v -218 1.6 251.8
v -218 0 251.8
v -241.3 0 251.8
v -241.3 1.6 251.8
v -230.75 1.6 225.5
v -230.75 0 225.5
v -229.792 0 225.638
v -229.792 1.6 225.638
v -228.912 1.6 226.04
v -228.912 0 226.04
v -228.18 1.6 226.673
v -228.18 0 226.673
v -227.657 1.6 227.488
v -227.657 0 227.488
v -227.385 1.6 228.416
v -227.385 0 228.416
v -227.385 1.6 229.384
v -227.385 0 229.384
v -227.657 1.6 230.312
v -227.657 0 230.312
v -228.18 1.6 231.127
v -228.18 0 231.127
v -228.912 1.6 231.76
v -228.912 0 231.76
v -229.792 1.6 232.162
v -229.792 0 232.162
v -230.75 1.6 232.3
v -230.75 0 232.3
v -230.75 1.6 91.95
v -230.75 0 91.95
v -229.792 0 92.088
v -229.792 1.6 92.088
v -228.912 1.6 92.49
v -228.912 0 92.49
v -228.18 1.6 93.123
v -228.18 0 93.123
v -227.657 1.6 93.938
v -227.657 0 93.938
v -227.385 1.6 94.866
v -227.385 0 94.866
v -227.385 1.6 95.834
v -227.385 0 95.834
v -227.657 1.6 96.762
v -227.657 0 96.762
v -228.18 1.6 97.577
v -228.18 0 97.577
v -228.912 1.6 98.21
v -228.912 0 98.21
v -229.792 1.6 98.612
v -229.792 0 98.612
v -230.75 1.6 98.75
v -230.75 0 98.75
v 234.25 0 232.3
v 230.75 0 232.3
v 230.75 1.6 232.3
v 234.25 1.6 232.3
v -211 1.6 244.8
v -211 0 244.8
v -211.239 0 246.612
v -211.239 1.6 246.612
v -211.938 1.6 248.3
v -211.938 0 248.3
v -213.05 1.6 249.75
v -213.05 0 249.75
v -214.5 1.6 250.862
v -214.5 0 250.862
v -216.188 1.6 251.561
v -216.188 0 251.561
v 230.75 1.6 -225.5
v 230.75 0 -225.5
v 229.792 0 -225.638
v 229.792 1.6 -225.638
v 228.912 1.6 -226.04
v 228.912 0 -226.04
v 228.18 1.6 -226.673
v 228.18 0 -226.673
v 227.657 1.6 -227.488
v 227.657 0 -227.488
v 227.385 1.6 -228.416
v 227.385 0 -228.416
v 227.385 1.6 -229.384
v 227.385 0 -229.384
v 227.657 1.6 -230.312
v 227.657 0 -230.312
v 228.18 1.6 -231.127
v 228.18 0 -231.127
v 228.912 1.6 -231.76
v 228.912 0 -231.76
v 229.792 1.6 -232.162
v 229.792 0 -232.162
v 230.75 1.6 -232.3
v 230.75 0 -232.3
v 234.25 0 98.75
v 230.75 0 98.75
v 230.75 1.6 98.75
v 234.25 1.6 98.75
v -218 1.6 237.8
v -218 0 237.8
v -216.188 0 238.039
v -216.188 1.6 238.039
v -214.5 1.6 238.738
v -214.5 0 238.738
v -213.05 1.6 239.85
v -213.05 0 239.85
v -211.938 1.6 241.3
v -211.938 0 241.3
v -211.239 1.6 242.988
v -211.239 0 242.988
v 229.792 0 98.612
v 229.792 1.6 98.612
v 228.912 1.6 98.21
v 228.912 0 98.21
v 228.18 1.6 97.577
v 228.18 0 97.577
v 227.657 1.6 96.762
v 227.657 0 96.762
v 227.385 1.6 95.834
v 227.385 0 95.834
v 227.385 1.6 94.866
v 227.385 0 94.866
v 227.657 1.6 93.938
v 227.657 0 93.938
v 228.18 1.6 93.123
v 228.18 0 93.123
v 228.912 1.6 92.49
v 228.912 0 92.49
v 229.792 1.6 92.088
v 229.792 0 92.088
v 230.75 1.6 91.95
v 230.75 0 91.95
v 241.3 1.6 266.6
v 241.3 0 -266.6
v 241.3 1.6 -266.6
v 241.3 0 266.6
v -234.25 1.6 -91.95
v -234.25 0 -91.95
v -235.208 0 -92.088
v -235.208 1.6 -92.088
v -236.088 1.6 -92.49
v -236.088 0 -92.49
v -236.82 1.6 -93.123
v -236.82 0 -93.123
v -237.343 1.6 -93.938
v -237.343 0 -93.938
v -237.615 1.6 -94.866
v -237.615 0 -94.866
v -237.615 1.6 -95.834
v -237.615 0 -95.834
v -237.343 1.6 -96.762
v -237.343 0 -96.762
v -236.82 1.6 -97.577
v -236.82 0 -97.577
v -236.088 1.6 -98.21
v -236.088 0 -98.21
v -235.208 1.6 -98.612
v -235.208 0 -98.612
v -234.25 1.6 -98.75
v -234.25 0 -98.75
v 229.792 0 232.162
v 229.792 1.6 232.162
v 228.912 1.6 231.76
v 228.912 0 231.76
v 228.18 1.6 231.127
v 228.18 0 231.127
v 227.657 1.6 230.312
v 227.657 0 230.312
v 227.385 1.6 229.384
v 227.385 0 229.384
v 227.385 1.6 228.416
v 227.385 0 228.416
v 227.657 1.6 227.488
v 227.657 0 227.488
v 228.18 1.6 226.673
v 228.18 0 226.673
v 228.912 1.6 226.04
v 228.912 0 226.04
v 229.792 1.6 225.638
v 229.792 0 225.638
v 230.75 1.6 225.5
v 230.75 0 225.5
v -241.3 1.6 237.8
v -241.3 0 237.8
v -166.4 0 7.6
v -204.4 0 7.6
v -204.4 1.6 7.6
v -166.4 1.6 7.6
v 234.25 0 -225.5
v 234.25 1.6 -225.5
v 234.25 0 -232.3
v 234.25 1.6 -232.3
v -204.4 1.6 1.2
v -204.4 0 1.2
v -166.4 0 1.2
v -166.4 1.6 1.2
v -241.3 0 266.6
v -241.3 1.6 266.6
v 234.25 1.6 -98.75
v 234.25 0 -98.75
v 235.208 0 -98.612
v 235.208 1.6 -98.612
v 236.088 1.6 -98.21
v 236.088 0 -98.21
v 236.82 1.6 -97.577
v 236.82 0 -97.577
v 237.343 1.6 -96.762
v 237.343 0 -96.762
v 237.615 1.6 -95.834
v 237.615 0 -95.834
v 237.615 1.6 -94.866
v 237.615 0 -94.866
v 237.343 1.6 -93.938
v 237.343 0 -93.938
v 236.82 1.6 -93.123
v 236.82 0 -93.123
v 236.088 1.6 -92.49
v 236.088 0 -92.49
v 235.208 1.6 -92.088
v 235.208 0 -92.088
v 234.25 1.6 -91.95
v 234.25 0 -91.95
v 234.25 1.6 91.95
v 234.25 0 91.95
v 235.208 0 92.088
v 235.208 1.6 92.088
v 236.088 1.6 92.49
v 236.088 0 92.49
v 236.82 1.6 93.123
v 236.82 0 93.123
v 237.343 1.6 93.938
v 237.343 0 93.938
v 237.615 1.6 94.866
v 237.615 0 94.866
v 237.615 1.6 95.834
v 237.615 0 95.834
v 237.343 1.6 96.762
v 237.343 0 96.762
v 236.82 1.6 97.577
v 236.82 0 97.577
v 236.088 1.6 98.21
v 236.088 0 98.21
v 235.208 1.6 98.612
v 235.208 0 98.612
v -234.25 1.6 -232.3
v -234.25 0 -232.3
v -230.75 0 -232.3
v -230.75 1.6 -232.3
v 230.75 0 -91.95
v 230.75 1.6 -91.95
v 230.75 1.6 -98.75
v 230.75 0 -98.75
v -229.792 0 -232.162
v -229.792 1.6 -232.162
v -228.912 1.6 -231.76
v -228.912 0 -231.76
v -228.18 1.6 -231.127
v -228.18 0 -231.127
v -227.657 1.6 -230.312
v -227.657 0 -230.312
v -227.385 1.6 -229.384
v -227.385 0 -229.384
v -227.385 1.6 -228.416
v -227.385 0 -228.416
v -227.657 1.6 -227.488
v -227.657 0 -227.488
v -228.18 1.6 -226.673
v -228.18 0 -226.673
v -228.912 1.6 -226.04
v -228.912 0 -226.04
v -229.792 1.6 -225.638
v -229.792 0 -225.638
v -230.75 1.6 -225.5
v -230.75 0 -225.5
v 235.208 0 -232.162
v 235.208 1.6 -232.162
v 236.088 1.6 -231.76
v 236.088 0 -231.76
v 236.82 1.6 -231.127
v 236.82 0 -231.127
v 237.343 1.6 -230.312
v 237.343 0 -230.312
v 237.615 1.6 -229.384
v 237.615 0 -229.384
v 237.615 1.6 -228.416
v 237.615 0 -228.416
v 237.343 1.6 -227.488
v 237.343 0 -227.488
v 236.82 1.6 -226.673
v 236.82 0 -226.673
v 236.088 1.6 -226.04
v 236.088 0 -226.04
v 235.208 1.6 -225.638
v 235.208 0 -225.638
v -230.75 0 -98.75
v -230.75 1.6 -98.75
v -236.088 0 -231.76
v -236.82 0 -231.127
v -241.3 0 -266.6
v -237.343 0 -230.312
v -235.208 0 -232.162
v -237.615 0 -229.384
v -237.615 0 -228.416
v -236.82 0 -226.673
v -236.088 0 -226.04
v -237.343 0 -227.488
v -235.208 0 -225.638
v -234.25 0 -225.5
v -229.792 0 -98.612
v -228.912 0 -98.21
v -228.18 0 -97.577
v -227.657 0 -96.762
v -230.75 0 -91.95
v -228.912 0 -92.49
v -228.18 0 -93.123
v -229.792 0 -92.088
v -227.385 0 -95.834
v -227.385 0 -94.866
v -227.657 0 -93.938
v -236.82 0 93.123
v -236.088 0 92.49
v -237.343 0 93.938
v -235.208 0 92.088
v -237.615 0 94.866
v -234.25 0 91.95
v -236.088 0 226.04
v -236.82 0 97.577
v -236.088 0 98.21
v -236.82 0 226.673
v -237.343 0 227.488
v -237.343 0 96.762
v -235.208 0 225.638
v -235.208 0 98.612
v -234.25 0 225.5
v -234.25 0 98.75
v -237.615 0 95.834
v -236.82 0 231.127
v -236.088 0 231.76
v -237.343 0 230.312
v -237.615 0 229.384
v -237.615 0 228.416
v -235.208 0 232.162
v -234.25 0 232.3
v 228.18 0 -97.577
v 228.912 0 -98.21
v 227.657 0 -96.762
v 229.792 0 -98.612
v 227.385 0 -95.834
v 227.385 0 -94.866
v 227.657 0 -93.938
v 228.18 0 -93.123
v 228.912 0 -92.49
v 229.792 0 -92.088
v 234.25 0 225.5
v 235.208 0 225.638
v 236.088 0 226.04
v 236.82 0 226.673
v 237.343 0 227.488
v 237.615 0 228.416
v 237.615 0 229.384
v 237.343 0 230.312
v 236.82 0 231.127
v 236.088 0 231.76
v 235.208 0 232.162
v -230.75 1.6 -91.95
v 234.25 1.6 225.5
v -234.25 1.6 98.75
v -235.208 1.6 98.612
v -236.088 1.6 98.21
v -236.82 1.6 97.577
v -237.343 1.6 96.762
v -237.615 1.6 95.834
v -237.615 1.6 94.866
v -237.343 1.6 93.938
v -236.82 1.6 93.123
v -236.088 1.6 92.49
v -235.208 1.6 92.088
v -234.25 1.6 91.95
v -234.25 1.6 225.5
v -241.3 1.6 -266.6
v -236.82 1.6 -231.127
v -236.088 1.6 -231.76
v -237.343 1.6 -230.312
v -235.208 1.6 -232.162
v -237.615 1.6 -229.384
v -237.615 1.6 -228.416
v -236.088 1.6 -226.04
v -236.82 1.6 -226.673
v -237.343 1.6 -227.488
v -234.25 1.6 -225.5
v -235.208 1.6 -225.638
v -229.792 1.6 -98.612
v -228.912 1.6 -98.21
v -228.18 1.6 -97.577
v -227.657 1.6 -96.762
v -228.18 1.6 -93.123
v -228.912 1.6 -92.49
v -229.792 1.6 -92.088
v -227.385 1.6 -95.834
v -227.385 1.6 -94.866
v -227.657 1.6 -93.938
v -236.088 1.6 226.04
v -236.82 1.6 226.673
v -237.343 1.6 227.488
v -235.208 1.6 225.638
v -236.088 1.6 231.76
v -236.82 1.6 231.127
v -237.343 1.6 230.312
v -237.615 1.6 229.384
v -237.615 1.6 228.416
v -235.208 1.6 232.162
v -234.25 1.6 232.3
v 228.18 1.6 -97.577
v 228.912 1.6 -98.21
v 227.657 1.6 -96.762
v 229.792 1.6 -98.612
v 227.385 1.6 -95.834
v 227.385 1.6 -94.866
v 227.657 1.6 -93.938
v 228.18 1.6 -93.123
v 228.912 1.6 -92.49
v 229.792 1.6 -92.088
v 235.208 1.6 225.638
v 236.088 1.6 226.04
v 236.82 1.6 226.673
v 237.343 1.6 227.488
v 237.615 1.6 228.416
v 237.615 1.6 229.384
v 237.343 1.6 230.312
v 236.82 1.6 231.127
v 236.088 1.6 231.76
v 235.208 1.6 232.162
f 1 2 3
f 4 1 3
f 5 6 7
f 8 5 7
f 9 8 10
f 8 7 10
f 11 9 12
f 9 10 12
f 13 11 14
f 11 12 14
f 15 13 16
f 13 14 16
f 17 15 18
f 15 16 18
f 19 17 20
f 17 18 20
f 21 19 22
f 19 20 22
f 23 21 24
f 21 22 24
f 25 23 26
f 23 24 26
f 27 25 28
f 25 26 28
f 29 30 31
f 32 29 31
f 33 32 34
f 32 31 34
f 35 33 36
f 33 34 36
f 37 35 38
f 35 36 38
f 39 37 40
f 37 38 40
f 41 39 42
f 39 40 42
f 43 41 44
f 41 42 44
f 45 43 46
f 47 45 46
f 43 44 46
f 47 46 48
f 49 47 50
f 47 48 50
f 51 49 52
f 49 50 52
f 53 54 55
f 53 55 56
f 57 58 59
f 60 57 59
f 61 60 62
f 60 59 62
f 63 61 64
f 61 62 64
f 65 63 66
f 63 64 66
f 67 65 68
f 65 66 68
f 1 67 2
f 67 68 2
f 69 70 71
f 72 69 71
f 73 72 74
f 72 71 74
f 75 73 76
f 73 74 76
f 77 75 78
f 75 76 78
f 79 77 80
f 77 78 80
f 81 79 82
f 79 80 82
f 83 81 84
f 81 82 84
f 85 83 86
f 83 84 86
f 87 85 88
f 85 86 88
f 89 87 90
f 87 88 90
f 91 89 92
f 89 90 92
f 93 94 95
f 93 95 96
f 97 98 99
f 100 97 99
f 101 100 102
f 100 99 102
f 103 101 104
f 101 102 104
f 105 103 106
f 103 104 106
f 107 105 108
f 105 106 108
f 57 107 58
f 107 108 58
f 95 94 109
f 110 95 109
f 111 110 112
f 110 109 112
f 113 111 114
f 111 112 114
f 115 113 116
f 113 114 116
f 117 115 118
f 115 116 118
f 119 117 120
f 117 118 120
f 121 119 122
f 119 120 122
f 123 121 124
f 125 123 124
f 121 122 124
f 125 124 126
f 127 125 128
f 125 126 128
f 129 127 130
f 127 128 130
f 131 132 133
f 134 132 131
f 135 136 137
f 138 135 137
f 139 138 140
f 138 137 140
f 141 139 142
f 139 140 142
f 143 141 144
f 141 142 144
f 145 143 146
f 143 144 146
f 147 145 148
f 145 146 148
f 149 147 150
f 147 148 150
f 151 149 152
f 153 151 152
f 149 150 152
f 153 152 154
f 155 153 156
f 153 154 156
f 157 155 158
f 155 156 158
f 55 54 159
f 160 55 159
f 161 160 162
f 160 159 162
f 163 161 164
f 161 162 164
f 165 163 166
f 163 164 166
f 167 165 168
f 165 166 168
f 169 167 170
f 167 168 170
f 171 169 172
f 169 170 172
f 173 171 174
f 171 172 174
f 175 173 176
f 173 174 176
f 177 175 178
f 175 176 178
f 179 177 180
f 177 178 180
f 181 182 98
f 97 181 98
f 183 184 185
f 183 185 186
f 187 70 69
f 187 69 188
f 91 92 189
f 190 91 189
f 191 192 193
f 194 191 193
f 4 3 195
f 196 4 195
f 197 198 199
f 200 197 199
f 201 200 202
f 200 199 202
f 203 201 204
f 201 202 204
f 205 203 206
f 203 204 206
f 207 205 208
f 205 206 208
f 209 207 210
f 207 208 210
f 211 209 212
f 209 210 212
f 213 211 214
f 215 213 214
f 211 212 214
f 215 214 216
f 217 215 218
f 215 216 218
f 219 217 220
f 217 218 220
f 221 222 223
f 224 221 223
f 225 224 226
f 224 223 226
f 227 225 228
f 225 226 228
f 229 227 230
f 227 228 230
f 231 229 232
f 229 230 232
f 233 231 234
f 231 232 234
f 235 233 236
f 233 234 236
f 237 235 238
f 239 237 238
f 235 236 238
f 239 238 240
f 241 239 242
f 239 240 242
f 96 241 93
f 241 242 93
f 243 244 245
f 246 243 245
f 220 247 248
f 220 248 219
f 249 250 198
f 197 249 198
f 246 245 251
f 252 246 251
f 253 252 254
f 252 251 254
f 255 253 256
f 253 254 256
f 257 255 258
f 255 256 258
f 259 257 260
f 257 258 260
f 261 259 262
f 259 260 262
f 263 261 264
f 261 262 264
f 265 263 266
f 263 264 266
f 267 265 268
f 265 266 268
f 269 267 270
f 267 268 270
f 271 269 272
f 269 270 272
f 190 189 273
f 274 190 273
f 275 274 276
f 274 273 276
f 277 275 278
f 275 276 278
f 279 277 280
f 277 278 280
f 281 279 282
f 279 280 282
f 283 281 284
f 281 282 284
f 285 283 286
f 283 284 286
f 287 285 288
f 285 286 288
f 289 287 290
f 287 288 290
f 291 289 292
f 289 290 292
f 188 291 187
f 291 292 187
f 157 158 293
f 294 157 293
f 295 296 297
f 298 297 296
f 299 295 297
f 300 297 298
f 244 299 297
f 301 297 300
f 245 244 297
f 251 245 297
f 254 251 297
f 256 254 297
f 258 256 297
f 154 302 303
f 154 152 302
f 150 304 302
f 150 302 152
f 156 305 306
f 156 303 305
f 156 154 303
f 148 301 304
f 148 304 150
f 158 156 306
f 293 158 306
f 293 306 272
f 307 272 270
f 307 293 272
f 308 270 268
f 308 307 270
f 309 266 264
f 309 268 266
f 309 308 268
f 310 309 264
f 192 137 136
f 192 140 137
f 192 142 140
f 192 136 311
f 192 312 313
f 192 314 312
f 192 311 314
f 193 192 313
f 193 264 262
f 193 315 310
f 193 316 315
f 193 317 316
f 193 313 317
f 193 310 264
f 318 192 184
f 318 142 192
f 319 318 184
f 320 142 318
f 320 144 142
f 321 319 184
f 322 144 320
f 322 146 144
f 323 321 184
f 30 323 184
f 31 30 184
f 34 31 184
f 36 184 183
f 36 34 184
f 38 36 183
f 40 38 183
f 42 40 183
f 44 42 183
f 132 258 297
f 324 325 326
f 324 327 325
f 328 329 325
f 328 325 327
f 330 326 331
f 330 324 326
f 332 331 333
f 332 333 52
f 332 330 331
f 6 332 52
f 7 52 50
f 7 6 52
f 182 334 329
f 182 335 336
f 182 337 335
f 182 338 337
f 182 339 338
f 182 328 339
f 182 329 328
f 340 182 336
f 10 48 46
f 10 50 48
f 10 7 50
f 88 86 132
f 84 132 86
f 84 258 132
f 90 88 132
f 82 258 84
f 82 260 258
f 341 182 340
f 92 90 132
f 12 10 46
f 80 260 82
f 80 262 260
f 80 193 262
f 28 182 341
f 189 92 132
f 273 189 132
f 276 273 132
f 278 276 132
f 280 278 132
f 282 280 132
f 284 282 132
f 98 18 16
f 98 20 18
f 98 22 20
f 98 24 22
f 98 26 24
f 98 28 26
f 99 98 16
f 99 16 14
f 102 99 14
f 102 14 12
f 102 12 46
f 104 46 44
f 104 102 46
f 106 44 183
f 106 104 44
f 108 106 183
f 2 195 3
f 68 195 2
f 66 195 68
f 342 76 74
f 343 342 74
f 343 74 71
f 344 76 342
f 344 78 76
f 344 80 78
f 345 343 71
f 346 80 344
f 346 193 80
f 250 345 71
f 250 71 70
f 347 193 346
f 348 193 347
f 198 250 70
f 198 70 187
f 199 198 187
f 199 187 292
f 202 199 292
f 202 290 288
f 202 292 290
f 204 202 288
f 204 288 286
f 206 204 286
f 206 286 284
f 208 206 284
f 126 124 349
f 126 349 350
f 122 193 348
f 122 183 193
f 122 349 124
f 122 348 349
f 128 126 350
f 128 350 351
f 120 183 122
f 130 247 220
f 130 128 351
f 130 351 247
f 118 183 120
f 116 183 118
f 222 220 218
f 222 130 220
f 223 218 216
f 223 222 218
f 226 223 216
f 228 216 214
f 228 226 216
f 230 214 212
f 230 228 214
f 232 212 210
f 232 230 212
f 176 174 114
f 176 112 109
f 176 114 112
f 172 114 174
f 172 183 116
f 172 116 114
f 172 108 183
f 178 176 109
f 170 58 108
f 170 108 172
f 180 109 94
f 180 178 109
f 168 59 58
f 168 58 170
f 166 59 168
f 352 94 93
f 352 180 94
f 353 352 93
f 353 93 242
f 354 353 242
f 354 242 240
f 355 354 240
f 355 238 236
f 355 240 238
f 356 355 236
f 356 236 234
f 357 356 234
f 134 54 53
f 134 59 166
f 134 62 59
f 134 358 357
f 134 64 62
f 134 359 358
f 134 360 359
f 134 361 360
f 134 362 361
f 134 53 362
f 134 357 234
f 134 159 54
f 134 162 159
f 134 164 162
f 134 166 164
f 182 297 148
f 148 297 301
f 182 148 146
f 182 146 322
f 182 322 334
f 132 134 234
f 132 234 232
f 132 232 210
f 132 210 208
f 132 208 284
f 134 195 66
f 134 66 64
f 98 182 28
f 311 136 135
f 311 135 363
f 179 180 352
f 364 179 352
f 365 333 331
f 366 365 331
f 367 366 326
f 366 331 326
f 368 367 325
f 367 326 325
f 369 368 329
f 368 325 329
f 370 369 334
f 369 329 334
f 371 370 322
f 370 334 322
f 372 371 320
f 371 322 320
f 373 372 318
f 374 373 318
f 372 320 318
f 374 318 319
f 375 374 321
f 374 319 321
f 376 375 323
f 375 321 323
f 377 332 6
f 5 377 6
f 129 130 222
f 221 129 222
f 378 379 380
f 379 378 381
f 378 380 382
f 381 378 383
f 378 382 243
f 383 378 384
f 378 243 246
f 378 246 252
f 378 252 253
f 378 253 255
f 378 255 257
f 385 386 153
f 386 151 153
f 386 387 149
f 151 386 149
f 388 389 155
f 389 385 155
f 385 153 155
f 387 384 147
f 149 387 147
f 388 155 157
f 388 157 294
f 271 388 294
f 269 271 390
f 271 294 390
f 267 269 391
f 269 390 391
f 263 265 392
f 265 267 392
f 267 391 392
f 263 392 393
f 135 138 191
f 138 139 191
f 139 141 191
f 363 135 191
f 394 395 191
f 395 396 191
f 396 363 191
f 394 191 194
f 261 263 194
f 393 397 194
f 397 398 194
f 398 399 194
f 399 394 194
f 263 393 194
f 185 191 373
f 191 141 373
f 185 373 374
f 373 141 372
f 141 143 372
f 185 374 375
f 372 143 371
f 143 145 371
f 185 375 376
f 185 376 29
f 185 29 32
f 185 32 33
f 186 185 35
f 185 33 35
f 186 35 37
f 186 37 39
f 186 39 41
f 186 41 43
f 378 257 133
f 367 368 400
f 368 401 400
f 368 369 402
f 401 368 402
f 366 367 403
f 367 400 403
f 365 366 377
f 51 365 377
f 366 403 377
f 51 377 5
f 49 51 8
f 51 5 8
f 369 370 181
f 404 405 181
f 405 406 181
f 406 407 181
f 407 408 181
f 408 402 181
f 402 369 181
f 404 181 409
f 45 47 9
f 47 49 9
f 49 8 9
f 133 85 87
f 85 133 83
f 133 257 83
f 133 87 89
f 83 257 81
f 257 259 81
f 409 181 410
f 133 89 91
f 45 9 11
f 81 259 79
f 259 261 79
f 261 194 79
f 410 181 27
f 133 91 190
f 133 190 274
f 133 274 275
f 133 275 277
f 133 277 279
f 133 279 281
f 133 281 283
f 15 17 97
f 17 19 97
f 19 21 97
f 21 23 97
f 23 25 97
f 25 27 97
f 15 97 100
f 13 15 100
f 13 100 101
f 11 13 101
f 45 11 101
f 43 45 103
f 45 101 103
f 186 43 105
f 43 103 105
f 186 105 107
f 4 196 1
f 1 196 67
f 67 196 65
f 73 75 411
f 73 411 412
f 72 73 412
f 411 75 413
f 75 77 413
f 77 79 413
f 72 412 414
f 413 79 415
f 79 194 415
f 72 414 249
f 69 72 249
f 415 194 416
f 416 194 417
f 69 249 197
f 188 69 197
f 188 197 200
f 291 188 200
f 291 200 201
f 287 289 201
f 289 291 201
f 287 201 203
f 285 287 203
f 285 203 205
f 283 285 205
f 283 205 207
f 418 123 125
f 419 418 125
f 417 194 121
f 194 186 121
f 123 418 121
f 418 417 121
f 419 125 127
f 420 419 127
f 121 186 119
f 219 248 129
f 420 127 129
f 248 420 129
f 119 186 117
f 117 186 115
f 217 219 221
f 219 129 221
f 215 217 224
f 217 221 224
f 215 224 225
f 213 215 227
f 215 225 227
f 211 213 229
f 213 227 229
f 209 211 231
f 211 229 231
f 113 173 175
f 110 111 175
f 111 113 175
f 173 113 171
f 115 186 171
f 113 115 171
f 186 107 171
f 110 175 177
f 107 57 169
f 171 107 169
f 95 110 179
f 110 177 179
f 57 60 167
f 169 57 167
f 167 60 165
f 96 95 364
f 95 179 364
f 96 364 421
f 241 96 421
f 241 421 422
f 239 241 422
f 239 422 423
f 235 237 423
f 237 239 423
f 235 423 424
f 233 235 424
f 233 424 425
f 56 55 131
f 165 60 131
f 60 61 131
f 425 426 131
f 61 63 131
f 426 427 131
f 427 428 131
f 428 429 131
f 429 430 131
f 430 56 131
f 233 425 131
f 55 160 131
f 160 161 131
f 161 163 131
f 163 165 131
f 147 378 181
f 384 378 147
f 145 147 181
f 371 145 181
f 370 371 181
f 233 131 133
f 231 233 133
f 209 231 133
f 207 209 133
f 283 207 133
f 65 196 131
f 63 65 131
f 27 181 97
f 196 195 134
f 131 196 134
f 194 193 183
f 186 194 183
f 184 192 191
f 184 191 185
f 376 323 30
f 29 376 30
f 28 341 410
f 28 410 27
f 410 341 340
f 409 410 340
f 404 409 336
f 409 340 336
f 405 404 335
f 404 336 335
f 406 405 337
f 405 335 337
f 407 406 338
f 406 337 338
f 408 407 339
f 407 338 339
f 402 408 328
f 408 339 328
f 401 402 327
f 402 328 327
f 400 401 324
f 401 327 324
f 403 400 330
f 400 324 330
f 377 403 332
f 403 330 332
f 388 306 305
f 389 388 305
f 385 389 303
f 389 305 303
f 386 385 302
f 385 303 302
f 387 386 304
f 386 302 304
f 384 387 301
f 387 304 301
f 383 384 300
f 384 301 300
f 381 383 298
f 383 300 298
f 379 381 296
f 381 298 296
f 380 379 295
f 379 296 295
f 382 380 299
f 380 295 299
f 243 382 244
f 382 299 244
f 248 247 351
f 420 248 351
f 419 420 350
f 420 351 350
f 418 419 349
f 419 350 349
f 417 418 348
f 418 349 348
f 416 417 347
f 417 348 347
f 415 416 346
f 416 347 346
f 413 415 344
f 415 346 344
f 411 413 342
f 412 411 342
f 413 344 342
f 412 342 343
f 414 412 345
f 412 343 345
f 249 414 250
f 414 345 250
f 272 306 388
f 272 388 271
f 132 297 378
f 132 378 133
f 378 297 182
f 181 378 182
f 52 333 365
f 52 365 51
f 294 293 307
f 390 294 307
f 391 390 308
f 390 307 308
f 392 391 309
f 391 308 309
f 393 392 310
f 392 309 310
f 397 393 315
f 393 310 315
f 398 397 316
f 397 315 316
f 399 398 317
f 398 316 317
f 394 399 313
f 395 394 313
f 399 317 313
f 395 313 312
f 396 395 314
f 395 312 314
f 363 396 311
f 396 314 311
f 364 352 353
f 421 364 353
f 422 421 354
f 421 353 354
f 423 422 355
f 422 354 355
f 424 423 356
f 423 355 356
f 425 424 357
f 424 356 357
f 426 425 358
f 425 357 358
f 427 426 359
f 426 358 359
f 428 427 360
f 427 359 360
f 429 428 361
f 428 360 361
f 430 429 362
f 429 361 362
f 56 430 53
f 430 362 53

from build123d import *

# Parameters (mm, degrees)
F0_W      = 482.6
F0_H      = 533.2
F1_DEPTH  = 1.6
F10_W     = 38
F10_H     = 6.4
F11_DEPTH = 1.6
F2_W      = 3.5
F2_H      = 6.8
F3_W      = 3.5
F3_H      = 6.8
F4_W      = 3.5
F4_H      = 6.8
F5_W      = 3.5
F5_H      = 6.8
F6_W      = 3.5
F6_H      = 6.8
F7_W      = 3.5
F7_H      = 6.8
F8_W      = 3.5
F8_H      = 6.8
F9_W      = 3.5
F9_H      = 6.8
F12_DEPTH = 1.6
F14_DEPTH = 1.6


with BuildPart() as f1:
    # F0 (on Front) → F1 (new body)
    with BuildSketch(Plane.XZ):
        Rectangle(F0_W, F0_H)
    extrude(amount=-F1_DEPTH)

    # F10 (on face) → F11 (cut)
    with BuildSketch(Plane.XZ):
        with Locations((-185.4, 4.4)):
            Rectangle(F10_W, F10_H)
    extrude(amount=-F11_DEPTH, mode=Mode.SUBTRACT)

    # F2 (on face) + F3 (on face) + F4 (on face) + F5 (on face) + F6 (on face) + F7 (on face) + F8 (on face) + F9 (on face) → F12 (cut)
    with BuildSketch(Plane.XZ):
        with Locations((-232.5, 228.9)):
            Rectangle(F2_W, F2_H)
        with BuildLine():
            Line((-230.75, 232.3), (-230.75, 225.5))
            ThreePointArc((-230.75, 225.5), (-227.35, 228.9), (-230.75, 232.3))
        make_face()
        with BuildLine():
            ThreePointArc((-234.25, 232.3), (-237.65, 228.9), (-234.25, 225.5))
            Line((-234.25, 225.5), (-234.25, 232.3))
        make_face()
    with BuildSketch(Plane.XZ):
        with Locations((-232.5, 95.35)):
            Rectangle(F3_W, F3_H)
        with BuildLine():
            Line((-230.75, 98.75), (-230.75, 91.95))
            ThreePointArc((-230.75, 91.95), (-227.35, 95.35), (-230.75, 98.75))
        make_face()
        with BuildLine():
            ThreePointArc((-234.25, 98.75), (-237.65, 95.35), (-234.25, 91.95))
            Line((-234.25, 91.95), (-234.25, 98.75))
        make_face()
    with BuildSketch(Plane.XZ):
        with Locations((-232.5, -95.35)):
            Rectangle(F4_W, F4_H)
        with BuildLine():
            Line((-230.75, -91.95), (-230.75, -98.75))
            ThreePointArc((-230.75, -98.75), (-227.35, -95.35), (-230.75, -91.95))
        make_face()
        with BuildLine():
            ThreePointArc((-234.25, -91.95), (-237.65, -95.35), (-234.25, -98.75))
            Line((-234.25, -98.75), (-234.25, -91.95))
        make_face()
    with BuildSketch(Plane.XZ):
        with Locations((-232.5, -228.9)):
            Rectangle(F5_W, F5_H)
        with BuildLine():
            Line((-230.75, -225.5), (-230.75, -232.3))
            ThreePointArc((-230.75, -232.3), (-227.35, -228.9), (-230.75, -225.5))
        make_face()
        with BuildLine():
            ThreePointArc((-234.25, -225.5), (-237.65, -228.9), (-234.25, -232.3))
            Line((-234.25, -232.3), (-234.25, -225.5))
        make_face()
    with BuildSketch(Plane.XZ):
        with Locations((232.5, 228.9)):
            Rectangle(F6_W, F6_H)
        with BuildLine():
            Line((234.25, 232.3), (234.25, 225.5))
            ThreePointArc((234.25, 225.5), (237.65, 228.9), (234.25, 232.3))
        make_face()
        with BuildLine():
            ThreePointArc((230.75, 232.3), (227.35, 228.9), (230.75, 225.5))
            Line((230.75, 225.5), (230.75, 232.3))
        make_face()
    with BuildSketch(Plane.XZ):
        with Locations((232.5, 95.35)):
            Rectangle(F7_W, F7_H)
        with BuildLine():
            Line((234.25, 98.75), (234.25, 91.95))
            ThreePointArc((234.25, 91.95), (237.65, 95.35), (234.25, 98.75))
        make_face()
        with BuildLine():
            ThreePointArc((230.75, 98.75), (227.35, 95.35), (230.75, 91.95))
            Line((230.75, 91.95), (230.75, 98.75))
        make_face()
    with BuildSketch(Plane.XZ):
        with Locations((232.5, -95.35)):
            Rectangle(F8_W, F8_H)
        with BuildLine():
            Line((234.25, -91.95), (234.25, -98.75))
            ThreePointArc((234.25, -98.75), (237.65, -95.35), (234.25, -91.95))
        make_face()
        with BuildLine():
            ThreePointArc((230.75, -91.95), (227.35, -95.35), (230.75, -98.75))
            Line((230.75, -98.75), (230.75, -91.95))
        make_face()
    with BuildSketch(Plane.XZ):
        with Locations((232.5, -228.9)):
            Rectangle(F9_W, F9_H)
        with BuildLine():
            Line((234.25, -225.5), (234.25, -232.3))
            ThreePointArc((234.25, -232.3), (237.65, -228.9), (234.25, -225.5))
        make_face()
        with BuildLine():
            ThreePointArc((230.75, -225.5), (227.35, -228.9), (230.75, -232.3))
            Line((230.75, -232.3), (230.75, -225.5))
        make_face()
    extrude(amount=-F12_DEPTH, mode=Mode.SUBTRACT)

    # F13 (on face) → F14 (cut)
    with BuildSketch(Plane.XZ):
        with BuildLine():
            Line((-218, 237.8), (-218, 251.8))
            ThreePointArc((-218, 251.8), (-225, 244.8), (-218, 237.8))
        make_face()
        with BuildLine():
            ThreePointArc((-218, 237.8), (-213.0502525317, 239.8502525317), (-211, 244.8))
            ThreePointArc((-211, 244.8), (-213.0502525317, 249.7497474683), (-218, 251.8))
            Line((-218, 251.8), (-218, 237.8))
        make_face()
        with BuildLine():
            ThreePointArc((-218, 237.8), (-225, 244.8), (-218, 251.8))
            Line((-218, 251.8), (-241.3, 251.8))
            Line((-241.3, 251.8), (-241.3, 237.8))
            Line((-241.3, 237.8), (-218, 237.8))
        make_face()
    extrude(amount=-F14_DEPTH, mode=Mode.SUBTRACT)


solid = f1.part
